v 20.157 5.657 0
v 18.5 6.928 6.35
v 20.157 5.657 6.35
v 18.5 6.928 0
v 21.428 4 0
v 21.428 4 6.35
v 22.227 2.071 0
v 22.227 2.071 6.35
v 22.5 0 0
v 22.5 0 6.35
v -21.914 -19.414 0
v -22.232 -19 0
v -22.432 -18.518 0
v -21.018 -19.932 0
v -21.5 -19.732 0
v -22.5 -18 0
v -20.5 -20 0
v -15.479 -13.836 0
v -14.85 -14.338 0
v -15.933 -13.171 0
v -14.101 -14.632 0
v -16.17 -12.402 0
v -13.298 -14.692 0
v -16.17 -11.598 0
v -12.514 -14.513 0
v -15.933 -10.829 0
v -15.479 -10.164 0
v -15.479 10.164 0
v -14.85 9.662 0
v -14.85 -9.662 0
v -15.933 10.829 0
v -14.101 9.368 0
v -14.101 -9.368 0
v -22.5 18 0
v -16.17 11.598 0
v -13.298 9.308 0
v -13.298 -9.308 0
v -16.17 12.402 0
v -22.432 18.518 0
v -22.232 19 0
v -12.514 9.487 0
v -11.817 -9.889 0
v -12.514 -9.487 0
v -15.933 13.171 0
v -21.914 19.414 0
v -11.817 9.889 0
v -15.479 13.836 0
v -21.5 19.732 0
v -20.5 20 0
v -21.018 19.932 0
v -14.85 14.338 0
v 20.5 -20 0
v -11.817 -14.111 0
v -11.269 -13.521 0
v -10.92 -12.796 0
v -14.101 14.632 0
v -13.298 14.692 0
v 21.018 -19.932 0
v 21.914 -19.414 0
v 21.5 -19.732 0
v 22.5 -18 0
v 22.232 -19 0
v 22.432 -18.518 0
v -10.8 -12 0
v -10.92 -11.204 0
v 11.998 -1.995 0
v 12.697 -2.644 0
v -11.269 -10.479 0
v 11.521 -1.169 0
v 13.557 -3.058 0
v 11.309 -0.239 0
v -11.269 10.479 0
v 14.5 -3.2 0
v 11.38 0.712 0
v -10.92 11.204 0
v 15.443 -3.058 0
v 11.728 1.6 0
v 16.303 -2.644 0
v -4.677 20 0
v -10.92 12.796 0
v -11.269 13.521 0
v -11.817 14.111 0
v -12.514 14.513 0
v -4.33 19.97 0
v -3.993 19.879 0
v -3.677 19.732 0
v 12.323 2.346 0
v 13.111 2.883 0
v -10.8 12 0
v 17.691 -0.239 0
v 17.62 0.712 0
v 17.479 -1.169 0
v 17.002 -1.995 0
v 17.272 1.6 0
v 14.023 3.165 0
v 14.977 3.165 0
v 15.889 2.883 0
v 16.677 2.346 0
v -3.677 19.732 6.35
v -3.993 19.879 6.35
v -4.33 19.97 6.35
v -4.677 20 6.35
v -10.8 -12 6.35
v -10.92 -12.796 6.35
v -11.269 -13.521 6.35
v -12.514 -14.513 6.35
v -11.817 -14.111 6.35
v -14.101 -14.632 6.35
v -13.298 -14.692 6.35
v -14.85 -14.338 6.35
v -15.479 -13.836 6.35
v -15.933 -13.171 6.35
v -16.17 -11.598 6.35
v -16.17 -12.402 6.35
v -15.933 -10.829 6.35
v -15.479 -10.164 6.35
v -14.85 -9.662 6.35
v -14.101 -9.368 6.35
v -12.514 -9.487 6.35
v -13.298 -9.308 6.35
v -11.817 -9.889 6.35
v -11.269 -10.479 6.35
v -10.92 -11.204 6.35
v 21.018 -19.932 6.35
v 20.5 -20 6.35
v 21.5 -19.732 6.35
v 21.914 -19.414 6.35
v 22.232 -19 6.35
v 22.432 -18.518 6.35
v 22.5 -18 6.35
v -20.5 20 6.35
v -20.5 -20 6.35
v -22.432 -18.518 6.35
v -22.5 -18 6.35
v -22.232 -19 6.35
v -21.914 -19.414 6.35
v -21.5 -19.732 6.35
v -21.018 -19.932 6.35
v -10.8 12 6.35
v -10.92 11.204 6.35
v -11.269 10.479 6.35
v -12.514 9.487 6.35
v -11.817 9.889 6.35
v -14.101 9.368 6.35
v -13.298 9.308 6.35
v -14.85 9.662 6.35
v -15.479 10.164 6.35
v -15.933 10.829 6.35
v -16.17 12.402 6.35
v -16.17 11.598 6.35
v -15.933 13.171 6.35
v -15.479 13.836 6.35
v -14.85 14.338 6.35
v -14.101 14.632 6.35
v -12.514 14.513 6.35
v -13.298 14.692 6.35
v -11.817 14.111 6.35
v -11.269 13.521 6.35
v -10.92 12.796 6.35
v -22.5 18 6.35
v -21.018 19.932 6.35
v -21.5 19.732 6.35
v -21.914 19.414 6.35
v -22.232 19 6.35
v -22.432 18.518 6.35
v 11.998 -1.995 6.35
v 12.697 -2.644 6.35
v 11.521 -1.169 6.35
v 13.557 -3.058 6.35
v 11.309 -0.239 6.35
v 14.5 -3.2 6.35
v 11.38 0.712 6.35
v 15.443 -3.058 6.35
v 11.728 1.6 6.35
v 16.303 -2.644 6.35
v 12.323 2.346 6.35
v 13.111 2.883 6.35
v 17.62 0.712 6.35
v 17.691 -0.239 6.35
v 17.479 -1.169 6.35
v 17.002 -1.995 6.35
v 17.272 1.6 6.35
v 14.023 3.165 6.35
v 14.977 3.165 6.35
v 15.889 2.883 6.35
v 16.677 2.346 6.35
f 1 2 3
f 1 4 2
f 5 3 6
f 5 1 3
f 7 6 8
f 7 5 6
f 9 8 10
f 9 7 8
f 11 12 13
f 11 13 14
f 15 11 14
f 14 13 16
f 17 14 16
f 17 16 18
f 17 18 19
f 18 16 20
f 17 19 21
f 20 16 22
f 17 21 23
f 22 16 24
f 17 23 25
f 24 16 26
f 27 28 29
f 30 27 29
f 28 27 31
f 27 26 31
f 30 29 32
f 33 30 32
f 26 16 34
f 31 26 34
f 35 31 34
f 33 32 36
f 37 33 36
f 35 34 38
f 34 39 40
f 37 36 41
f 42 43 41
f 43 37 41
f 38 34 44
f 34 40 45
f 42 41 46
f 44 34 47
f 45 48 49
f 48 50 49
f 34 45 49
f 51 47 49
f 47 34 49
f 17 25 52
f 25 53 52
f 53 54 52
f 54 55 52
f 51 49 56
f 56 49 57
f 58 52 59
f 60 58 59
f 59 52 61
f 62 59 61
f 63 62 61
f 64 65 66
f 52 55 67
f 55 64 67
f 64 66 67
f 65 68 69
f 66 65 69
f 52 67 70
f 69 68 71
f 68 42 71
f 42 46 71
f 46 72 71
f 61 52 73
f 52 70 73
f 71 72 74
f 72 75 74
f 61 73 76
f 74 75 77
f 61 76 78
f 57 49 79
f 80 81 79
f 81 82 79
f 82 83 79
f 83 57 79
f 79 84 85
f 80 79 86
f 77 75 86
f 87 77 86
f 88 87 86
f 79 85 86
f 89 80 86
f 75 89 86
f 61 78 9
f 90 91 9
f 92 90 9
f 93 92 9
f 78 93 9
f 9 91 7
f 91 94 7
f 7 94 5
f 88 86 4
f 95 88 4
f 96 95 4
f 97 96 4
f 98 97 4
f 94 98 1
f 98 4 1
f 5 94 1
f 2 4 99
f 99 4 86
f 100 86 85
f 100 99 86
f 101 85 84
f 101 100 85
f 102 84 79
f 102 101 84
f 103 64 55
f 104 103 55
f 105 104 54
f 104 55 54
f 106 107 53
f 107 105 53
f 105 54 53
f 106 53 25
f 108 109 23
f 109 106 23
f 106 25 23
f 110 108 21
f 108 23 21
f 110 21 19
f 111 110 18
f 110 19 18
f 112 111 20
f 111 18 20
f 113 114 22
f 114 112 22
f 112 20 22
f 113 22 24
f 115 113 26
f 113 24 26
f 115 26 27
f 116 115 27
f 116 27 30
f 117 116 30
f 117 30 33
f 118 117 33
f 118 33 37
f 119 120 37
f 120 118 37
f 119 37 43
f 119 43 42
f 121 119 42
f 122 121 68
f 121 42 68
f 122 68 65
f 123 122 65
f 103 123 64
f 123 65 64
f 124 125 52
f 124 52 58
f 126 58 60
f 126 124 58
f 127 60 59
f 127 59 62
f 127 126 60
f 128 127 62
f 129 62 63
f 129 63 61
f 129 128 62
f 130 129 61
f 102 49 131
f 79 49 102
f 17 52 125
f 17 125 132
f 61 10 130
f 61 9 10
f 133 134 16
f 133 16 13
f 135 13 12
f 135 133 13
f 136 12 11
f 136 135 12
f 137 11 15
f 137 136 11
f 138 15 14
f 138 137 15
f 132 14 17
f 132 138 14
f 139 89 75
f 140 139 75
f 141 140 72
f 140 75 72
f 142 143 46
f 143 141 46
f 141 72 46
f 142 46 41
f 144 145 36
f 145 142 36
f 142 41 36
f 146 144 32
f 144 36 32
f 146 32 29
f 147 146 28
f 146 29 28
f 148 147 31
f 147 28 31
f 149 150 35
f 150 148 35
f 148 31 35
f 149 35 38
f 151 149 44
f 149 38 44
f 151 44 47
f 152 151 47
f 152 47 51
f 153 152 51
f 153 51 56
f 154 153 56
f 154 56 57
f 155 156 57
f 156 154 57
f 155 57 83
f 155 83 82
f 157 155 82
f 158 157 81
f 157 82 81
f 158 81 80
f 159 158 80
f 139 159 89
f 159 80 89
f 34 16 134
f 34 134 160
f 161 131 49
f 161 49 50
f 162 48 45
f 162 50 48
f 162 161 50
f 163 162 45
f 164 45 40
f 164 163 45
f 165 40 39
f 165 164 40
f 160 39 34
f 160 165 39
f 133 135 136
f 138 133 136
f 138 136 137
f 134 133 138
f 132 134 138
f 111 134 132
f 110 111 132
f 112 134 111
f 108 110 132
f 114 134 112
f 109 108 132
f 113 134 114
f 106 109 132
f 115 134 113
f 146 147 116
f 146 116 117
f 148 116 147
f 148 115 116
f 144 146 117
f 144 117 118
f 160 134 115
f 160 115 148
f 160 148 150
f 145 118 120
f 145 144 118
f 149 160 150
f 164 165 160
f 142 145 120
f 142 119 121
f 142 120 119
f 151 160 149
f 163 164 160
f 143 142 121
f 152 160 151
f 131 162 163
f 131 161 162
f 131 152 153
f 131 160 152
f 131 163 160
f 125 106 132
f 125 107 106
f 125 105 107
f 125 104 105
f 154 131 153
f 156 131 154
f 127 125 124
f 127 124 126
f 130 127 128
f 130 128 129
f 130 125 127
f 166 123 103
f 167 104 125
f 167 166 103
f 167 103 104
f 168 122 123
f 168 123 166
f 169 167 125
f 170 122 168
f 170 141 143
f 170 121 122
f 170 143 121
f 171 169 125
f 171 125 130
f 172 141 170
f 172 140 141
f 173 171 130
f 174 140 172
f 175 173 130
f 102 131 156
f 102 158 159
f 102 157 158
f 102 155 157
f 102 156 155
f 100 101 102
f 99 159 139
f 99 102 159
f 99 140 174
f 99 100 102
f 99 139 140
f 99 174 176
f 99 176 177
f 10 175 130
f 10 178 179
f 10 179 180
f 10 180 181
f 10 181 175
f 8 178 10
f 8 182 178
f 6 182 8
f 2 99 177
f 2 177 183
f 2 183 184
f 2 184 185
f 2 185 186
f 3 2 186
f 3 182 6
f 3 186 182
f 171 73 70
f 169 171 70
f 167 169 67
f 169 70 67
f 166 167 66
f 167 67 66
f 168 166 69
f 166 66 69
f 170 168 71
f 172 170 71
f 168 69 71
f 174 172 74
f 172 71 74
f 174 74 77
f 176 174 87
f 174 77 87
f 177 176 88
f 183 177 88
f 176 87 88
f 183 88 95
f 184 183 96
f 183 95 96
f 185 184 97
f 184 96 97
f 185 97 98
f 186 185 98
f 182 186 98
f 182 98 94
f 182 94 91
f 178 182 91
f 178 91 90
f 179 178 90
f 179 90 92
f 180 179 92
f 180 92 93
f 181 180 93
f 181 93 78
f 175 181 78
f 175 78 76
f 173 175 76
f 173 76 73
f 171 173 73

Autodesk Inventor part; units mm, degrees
ref_plane "YZ Plane" through (0, 0, 0) normal (1, 0, 0) x (0, 1, 0)
ref_plane "XZ Plane" through (0, 0, 0) normal (0, 1, 0) x (-1, 0, 0)
ref_plane "XY Plane" through (0, 0, 0) normal (0, 0, 1) x (1, 0, 0)
sketch "Sketch1" plane through (0, 0, 0) normal (0, 0, 1) x (1, 0, 0)
  line L0 (22.5, -20) -> (-22.5, -20)
  line L1 (-22.5, -20) -> (-22.5, 20)
  line L2 (-22.5, 20) -> (22.5, 20)
  line L3 (22.5, 20) -> (22.5, -20)
  line L4 (22.5, -20) -> (-22.5, 20) construction
  line L5 (-22.5, -20) -> (22.5, 20) construction
  circle A0 centre (14.5, 0) radius 8
  line L6 (18.5, 6.9282) -> (-4.141, 20)
  circle A1 centre (-13.5, 12) radius 2.7
  circle A2 centre (-13.5, -12) radius 2.7
  point P0 (0, 0)
  point P1 (22.5, 0)
  dimension "d4" = 16
  dimension "d0" = 40
  dimension "d1" = 9
  dimension "d2" = 8
  dimension "d3" = 8
  dimension "d5" = 28
  dimension "d6" = 30
  dimension "d7" = 20
  dimension "d8" = 5.4
extrude "Extrusion1" add sketch "Sketch1" along normal blind 6.35 contours L0 L1 L2 L6 A0 L3 | A0
sketch "Sketch2" plane through (0, 0, 6.35) normal (0, 0, 1) x (1, 0, 0)
  arc A0 (22.5, 0) -> (18.5, 6.9282) centre (14.5, 0) ccw projected
  point P0 (0, 0)
hole "Hole1" at (14.5, 0, 6.35) direction (0, 0, -1) diameter 6.4008 end through all thread size "5/16-18 UNC" class "2B" standard "ANSI Unified Screw Threads"
fillet "Fillet1" radius 2 4 edges at (-22.5, 20, 3.175) (-22.5, -20, 3.175) (22.5, -20, 3.175) (-4.141, 20, 3.175)
equation "\"d3\" = d2"
properties part number "Gas Strut Lower Plate"
